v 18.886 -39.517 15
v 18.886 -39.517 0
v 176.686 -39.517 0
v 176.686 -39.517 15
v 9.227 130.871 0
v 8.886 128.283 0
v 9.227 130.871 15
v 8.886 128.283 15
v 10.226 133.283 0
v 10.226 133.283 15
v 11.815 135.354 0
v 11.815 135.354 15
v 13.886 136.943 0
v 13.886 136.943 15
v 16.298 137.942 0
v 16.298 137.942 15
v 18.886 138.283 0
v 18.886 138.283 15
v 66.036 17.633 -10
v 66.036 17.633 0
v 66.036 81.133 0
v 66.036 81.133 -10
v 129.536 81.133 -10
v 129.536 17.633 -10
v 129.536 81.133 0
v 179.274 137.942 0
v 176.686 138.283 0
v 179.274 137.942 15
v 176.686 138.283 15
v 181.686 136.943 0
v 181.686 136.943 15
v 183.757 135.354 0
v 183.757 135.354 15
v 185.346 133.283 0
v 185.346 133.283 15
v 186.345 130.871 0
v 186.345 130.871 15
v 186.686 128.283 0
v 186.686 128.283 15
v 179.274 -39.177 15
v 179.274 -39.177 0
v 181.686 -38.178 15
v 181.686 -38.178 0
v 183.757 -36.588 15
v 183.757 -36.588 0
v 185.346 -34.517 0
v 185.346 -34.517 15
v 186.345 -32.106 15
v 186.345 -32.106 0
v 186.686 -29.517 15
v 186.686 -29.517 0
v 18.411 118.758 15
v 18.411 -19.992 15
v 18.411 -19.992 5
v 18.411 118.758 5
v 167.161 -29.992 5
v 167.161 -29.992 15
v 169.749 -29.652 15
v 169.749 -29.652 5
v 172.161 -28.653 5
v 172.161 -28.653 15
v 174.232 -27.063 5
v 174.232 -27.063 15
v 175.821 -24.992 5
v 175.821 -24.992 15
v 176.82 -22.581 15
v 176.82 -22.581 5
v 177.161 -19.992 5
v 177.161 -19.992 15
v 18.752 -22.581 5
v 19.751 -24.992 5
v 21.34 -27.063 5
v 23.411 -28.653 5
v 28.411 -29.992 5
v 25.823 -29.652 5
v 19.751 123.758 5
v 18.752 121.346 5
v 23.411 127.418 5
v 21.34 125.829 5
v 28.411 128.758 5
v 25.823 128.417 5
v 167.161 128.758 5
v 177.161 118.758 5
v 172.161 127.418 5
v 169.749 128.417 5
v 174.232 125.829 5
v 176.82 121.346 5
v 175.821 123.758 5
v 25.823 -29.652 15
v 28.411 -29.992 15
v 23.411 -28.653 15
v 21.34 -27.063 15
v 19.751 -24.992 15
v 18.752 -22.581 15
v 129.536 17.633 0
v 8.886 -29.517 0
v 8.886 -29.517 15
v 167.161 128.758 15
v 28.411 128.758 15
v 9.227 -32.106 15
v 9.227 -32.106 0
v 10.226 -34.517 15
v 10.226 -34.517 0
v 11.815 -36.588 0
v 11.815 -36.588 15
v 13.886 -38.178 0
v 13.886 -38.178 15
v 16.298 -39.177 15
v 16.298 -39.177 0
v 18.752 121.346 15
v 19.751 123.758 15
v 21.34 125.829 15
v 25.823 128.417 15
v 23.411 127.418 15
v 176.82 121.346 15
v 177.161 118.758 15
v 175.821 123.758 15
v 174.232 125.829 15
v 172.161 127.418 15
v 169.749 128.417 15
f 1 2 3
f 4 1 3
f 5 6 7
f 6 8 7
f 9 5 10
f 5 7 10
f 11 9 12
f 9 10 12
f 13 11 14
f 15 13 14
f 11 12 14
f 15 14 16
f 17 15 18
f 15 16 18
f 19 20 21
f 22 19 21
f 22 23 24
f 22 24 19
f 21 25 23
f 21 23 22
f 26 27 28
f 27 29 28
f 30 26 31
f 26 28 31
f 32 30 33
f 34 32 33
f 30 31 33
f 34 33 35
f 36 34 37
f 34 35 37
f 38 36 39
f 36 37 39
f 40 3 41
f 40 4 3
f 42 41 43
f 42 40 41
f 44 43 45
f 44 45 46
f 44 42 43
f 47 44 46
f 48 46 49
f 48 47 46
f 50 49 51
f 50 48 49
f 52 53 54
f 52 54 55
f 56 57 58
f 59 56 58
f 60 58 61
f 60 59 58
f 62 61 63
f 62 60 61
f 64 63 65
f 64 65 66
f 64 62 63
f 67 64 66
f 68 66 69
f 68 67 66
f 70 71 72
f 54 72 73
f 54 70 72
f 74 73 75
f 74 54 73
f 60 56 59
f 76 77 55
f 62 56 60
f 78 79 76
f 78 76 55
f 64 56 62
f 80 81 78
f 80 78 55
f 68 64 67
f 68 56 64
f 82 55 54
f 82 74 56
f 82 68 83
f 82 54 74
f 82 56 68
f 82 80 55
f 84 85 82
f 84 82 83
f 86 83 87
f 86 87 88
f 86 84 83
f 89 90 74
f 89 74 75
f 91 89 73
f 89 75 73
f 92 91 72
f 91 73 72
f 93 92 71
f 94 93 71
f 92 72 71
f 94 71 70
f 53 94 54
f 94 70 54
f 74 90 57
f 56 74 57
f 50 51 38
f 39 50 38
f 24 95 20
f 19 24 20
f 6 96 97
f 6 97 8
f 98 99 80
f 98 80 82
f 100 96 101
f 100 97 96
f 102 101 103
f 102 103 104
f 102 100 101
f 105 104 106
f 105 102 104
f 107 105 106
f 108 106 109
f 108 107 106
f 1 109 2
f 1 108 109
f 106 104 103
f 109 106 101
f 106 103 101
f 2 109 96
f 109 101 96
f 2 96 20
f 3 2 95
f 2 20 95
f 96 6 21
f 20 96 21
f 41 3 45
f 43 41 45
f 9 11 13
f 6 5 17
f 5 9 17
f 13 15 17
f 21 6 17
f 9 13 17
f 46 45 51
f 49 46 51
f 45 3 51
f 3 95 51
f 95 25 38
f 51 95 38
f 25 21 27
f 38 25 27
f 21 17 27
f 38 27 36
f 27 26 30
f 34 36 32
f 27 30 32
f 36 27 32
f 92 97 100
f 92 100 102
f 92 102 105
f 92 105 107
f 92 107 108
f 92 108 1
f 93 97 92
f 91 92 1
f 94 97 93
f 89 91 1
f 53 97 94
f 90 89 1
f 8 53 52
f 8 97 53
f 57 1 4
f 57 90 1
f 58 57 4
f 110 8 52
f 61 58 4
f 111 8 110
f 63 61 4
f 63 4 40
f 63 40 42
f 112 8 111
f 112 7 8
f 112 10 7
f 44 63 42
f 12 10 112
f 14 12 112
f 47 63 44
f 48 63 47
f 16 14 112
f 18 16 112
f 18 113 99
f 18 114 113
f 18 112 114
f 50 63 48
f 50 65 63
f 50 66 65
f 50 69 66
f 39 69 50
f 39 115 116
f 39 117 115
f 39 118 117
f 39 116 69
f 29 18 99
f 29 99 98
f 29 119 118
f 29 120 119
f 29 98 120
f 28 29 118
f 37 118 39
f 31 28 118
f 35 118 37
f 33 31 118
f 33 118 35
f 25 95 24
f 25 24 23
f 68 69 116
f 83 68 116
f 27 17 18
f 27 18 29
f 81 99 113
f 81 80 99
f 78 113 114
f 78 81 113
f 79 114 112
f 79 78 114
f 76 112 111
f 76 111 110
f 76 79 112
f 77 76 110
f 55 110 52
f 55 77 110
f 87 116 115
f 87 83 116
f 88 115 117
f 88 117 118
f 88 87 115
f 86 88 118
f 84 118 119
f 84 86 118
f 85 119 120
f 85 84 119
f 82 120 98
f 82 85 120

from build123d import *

# Parameters (mm, degrees)
SKETCH1_W           = 177.8
SKETCH1_H           = 177.8
BOSS_EXTRUDE1_DEPTH = 15
SKETCH2_W           = 158.75
SKETCH2_H           = 158.75
CUT_EXTRUDE1_DEPTH  = 10
FILLET1_R           = 10
SKETCH3_W           = 63.5
SKETCH3_H           = 63.5
BOSS_EXTRUDE2_DEPTH = 10


with BuildPart() as part:
    # Sketch1 → Boss-Extrude1 (new body)
    with BuildSketch(Plane.XY):
        with Locations((97.785967035, 49.382663919)):
            Rectangle(SKETCH1_W, SKETCH1_H)
    extrude(amount=BOSS_EXTRUDE1_DEPTH)

    # Sketch2 → Cut-Extrude1 (cut)
    with BuildSketch(Plane.XY.offset(15)):
        with Locations((97.785967035, 49.382663919)):
            Rectangle(SKETCH2_W, SKETCH2_H)
    extrude(amount=-CUT_EXTRUDE1_DEPTH, mode=Mode.SUBTRACT)

    # Fillet1
    fillet1_edges = [part.edges().sort_by_distance(p)[0] for p in [
        (177.160967035, 128.757663919, 10),
        (177.160967035, -29.992336081, 10),
        (18.410967035, -29.992336081, 10),
        (18.410967035, 128.757663919, 10),
        (8.885967035, 138.282663919, 7.5),
        (186.685967035, 138.282663919, 7.5),
        (186.685967035, -39.517336081, 7.5),
        (8.885967035, -39.517336081, 7.5),
    ]]
    fillet(fillet1_edges, radius=FILLET1_R)

    # Sketch3 → Boss-Extrude2 (add)
    with BuildSketch(Plane(origin=(0, 0, 0), x_dir=(-1, 0, 0), z_dir=(0, 0, -1))):
        with Locations((-97.785967035, 49.382663919)):
            Rectangle(SKETCH3_W, SKETCH3_H)
    extrude(amount=BOSS_EXTRUDE2_DEPTH)


solid = part.part
